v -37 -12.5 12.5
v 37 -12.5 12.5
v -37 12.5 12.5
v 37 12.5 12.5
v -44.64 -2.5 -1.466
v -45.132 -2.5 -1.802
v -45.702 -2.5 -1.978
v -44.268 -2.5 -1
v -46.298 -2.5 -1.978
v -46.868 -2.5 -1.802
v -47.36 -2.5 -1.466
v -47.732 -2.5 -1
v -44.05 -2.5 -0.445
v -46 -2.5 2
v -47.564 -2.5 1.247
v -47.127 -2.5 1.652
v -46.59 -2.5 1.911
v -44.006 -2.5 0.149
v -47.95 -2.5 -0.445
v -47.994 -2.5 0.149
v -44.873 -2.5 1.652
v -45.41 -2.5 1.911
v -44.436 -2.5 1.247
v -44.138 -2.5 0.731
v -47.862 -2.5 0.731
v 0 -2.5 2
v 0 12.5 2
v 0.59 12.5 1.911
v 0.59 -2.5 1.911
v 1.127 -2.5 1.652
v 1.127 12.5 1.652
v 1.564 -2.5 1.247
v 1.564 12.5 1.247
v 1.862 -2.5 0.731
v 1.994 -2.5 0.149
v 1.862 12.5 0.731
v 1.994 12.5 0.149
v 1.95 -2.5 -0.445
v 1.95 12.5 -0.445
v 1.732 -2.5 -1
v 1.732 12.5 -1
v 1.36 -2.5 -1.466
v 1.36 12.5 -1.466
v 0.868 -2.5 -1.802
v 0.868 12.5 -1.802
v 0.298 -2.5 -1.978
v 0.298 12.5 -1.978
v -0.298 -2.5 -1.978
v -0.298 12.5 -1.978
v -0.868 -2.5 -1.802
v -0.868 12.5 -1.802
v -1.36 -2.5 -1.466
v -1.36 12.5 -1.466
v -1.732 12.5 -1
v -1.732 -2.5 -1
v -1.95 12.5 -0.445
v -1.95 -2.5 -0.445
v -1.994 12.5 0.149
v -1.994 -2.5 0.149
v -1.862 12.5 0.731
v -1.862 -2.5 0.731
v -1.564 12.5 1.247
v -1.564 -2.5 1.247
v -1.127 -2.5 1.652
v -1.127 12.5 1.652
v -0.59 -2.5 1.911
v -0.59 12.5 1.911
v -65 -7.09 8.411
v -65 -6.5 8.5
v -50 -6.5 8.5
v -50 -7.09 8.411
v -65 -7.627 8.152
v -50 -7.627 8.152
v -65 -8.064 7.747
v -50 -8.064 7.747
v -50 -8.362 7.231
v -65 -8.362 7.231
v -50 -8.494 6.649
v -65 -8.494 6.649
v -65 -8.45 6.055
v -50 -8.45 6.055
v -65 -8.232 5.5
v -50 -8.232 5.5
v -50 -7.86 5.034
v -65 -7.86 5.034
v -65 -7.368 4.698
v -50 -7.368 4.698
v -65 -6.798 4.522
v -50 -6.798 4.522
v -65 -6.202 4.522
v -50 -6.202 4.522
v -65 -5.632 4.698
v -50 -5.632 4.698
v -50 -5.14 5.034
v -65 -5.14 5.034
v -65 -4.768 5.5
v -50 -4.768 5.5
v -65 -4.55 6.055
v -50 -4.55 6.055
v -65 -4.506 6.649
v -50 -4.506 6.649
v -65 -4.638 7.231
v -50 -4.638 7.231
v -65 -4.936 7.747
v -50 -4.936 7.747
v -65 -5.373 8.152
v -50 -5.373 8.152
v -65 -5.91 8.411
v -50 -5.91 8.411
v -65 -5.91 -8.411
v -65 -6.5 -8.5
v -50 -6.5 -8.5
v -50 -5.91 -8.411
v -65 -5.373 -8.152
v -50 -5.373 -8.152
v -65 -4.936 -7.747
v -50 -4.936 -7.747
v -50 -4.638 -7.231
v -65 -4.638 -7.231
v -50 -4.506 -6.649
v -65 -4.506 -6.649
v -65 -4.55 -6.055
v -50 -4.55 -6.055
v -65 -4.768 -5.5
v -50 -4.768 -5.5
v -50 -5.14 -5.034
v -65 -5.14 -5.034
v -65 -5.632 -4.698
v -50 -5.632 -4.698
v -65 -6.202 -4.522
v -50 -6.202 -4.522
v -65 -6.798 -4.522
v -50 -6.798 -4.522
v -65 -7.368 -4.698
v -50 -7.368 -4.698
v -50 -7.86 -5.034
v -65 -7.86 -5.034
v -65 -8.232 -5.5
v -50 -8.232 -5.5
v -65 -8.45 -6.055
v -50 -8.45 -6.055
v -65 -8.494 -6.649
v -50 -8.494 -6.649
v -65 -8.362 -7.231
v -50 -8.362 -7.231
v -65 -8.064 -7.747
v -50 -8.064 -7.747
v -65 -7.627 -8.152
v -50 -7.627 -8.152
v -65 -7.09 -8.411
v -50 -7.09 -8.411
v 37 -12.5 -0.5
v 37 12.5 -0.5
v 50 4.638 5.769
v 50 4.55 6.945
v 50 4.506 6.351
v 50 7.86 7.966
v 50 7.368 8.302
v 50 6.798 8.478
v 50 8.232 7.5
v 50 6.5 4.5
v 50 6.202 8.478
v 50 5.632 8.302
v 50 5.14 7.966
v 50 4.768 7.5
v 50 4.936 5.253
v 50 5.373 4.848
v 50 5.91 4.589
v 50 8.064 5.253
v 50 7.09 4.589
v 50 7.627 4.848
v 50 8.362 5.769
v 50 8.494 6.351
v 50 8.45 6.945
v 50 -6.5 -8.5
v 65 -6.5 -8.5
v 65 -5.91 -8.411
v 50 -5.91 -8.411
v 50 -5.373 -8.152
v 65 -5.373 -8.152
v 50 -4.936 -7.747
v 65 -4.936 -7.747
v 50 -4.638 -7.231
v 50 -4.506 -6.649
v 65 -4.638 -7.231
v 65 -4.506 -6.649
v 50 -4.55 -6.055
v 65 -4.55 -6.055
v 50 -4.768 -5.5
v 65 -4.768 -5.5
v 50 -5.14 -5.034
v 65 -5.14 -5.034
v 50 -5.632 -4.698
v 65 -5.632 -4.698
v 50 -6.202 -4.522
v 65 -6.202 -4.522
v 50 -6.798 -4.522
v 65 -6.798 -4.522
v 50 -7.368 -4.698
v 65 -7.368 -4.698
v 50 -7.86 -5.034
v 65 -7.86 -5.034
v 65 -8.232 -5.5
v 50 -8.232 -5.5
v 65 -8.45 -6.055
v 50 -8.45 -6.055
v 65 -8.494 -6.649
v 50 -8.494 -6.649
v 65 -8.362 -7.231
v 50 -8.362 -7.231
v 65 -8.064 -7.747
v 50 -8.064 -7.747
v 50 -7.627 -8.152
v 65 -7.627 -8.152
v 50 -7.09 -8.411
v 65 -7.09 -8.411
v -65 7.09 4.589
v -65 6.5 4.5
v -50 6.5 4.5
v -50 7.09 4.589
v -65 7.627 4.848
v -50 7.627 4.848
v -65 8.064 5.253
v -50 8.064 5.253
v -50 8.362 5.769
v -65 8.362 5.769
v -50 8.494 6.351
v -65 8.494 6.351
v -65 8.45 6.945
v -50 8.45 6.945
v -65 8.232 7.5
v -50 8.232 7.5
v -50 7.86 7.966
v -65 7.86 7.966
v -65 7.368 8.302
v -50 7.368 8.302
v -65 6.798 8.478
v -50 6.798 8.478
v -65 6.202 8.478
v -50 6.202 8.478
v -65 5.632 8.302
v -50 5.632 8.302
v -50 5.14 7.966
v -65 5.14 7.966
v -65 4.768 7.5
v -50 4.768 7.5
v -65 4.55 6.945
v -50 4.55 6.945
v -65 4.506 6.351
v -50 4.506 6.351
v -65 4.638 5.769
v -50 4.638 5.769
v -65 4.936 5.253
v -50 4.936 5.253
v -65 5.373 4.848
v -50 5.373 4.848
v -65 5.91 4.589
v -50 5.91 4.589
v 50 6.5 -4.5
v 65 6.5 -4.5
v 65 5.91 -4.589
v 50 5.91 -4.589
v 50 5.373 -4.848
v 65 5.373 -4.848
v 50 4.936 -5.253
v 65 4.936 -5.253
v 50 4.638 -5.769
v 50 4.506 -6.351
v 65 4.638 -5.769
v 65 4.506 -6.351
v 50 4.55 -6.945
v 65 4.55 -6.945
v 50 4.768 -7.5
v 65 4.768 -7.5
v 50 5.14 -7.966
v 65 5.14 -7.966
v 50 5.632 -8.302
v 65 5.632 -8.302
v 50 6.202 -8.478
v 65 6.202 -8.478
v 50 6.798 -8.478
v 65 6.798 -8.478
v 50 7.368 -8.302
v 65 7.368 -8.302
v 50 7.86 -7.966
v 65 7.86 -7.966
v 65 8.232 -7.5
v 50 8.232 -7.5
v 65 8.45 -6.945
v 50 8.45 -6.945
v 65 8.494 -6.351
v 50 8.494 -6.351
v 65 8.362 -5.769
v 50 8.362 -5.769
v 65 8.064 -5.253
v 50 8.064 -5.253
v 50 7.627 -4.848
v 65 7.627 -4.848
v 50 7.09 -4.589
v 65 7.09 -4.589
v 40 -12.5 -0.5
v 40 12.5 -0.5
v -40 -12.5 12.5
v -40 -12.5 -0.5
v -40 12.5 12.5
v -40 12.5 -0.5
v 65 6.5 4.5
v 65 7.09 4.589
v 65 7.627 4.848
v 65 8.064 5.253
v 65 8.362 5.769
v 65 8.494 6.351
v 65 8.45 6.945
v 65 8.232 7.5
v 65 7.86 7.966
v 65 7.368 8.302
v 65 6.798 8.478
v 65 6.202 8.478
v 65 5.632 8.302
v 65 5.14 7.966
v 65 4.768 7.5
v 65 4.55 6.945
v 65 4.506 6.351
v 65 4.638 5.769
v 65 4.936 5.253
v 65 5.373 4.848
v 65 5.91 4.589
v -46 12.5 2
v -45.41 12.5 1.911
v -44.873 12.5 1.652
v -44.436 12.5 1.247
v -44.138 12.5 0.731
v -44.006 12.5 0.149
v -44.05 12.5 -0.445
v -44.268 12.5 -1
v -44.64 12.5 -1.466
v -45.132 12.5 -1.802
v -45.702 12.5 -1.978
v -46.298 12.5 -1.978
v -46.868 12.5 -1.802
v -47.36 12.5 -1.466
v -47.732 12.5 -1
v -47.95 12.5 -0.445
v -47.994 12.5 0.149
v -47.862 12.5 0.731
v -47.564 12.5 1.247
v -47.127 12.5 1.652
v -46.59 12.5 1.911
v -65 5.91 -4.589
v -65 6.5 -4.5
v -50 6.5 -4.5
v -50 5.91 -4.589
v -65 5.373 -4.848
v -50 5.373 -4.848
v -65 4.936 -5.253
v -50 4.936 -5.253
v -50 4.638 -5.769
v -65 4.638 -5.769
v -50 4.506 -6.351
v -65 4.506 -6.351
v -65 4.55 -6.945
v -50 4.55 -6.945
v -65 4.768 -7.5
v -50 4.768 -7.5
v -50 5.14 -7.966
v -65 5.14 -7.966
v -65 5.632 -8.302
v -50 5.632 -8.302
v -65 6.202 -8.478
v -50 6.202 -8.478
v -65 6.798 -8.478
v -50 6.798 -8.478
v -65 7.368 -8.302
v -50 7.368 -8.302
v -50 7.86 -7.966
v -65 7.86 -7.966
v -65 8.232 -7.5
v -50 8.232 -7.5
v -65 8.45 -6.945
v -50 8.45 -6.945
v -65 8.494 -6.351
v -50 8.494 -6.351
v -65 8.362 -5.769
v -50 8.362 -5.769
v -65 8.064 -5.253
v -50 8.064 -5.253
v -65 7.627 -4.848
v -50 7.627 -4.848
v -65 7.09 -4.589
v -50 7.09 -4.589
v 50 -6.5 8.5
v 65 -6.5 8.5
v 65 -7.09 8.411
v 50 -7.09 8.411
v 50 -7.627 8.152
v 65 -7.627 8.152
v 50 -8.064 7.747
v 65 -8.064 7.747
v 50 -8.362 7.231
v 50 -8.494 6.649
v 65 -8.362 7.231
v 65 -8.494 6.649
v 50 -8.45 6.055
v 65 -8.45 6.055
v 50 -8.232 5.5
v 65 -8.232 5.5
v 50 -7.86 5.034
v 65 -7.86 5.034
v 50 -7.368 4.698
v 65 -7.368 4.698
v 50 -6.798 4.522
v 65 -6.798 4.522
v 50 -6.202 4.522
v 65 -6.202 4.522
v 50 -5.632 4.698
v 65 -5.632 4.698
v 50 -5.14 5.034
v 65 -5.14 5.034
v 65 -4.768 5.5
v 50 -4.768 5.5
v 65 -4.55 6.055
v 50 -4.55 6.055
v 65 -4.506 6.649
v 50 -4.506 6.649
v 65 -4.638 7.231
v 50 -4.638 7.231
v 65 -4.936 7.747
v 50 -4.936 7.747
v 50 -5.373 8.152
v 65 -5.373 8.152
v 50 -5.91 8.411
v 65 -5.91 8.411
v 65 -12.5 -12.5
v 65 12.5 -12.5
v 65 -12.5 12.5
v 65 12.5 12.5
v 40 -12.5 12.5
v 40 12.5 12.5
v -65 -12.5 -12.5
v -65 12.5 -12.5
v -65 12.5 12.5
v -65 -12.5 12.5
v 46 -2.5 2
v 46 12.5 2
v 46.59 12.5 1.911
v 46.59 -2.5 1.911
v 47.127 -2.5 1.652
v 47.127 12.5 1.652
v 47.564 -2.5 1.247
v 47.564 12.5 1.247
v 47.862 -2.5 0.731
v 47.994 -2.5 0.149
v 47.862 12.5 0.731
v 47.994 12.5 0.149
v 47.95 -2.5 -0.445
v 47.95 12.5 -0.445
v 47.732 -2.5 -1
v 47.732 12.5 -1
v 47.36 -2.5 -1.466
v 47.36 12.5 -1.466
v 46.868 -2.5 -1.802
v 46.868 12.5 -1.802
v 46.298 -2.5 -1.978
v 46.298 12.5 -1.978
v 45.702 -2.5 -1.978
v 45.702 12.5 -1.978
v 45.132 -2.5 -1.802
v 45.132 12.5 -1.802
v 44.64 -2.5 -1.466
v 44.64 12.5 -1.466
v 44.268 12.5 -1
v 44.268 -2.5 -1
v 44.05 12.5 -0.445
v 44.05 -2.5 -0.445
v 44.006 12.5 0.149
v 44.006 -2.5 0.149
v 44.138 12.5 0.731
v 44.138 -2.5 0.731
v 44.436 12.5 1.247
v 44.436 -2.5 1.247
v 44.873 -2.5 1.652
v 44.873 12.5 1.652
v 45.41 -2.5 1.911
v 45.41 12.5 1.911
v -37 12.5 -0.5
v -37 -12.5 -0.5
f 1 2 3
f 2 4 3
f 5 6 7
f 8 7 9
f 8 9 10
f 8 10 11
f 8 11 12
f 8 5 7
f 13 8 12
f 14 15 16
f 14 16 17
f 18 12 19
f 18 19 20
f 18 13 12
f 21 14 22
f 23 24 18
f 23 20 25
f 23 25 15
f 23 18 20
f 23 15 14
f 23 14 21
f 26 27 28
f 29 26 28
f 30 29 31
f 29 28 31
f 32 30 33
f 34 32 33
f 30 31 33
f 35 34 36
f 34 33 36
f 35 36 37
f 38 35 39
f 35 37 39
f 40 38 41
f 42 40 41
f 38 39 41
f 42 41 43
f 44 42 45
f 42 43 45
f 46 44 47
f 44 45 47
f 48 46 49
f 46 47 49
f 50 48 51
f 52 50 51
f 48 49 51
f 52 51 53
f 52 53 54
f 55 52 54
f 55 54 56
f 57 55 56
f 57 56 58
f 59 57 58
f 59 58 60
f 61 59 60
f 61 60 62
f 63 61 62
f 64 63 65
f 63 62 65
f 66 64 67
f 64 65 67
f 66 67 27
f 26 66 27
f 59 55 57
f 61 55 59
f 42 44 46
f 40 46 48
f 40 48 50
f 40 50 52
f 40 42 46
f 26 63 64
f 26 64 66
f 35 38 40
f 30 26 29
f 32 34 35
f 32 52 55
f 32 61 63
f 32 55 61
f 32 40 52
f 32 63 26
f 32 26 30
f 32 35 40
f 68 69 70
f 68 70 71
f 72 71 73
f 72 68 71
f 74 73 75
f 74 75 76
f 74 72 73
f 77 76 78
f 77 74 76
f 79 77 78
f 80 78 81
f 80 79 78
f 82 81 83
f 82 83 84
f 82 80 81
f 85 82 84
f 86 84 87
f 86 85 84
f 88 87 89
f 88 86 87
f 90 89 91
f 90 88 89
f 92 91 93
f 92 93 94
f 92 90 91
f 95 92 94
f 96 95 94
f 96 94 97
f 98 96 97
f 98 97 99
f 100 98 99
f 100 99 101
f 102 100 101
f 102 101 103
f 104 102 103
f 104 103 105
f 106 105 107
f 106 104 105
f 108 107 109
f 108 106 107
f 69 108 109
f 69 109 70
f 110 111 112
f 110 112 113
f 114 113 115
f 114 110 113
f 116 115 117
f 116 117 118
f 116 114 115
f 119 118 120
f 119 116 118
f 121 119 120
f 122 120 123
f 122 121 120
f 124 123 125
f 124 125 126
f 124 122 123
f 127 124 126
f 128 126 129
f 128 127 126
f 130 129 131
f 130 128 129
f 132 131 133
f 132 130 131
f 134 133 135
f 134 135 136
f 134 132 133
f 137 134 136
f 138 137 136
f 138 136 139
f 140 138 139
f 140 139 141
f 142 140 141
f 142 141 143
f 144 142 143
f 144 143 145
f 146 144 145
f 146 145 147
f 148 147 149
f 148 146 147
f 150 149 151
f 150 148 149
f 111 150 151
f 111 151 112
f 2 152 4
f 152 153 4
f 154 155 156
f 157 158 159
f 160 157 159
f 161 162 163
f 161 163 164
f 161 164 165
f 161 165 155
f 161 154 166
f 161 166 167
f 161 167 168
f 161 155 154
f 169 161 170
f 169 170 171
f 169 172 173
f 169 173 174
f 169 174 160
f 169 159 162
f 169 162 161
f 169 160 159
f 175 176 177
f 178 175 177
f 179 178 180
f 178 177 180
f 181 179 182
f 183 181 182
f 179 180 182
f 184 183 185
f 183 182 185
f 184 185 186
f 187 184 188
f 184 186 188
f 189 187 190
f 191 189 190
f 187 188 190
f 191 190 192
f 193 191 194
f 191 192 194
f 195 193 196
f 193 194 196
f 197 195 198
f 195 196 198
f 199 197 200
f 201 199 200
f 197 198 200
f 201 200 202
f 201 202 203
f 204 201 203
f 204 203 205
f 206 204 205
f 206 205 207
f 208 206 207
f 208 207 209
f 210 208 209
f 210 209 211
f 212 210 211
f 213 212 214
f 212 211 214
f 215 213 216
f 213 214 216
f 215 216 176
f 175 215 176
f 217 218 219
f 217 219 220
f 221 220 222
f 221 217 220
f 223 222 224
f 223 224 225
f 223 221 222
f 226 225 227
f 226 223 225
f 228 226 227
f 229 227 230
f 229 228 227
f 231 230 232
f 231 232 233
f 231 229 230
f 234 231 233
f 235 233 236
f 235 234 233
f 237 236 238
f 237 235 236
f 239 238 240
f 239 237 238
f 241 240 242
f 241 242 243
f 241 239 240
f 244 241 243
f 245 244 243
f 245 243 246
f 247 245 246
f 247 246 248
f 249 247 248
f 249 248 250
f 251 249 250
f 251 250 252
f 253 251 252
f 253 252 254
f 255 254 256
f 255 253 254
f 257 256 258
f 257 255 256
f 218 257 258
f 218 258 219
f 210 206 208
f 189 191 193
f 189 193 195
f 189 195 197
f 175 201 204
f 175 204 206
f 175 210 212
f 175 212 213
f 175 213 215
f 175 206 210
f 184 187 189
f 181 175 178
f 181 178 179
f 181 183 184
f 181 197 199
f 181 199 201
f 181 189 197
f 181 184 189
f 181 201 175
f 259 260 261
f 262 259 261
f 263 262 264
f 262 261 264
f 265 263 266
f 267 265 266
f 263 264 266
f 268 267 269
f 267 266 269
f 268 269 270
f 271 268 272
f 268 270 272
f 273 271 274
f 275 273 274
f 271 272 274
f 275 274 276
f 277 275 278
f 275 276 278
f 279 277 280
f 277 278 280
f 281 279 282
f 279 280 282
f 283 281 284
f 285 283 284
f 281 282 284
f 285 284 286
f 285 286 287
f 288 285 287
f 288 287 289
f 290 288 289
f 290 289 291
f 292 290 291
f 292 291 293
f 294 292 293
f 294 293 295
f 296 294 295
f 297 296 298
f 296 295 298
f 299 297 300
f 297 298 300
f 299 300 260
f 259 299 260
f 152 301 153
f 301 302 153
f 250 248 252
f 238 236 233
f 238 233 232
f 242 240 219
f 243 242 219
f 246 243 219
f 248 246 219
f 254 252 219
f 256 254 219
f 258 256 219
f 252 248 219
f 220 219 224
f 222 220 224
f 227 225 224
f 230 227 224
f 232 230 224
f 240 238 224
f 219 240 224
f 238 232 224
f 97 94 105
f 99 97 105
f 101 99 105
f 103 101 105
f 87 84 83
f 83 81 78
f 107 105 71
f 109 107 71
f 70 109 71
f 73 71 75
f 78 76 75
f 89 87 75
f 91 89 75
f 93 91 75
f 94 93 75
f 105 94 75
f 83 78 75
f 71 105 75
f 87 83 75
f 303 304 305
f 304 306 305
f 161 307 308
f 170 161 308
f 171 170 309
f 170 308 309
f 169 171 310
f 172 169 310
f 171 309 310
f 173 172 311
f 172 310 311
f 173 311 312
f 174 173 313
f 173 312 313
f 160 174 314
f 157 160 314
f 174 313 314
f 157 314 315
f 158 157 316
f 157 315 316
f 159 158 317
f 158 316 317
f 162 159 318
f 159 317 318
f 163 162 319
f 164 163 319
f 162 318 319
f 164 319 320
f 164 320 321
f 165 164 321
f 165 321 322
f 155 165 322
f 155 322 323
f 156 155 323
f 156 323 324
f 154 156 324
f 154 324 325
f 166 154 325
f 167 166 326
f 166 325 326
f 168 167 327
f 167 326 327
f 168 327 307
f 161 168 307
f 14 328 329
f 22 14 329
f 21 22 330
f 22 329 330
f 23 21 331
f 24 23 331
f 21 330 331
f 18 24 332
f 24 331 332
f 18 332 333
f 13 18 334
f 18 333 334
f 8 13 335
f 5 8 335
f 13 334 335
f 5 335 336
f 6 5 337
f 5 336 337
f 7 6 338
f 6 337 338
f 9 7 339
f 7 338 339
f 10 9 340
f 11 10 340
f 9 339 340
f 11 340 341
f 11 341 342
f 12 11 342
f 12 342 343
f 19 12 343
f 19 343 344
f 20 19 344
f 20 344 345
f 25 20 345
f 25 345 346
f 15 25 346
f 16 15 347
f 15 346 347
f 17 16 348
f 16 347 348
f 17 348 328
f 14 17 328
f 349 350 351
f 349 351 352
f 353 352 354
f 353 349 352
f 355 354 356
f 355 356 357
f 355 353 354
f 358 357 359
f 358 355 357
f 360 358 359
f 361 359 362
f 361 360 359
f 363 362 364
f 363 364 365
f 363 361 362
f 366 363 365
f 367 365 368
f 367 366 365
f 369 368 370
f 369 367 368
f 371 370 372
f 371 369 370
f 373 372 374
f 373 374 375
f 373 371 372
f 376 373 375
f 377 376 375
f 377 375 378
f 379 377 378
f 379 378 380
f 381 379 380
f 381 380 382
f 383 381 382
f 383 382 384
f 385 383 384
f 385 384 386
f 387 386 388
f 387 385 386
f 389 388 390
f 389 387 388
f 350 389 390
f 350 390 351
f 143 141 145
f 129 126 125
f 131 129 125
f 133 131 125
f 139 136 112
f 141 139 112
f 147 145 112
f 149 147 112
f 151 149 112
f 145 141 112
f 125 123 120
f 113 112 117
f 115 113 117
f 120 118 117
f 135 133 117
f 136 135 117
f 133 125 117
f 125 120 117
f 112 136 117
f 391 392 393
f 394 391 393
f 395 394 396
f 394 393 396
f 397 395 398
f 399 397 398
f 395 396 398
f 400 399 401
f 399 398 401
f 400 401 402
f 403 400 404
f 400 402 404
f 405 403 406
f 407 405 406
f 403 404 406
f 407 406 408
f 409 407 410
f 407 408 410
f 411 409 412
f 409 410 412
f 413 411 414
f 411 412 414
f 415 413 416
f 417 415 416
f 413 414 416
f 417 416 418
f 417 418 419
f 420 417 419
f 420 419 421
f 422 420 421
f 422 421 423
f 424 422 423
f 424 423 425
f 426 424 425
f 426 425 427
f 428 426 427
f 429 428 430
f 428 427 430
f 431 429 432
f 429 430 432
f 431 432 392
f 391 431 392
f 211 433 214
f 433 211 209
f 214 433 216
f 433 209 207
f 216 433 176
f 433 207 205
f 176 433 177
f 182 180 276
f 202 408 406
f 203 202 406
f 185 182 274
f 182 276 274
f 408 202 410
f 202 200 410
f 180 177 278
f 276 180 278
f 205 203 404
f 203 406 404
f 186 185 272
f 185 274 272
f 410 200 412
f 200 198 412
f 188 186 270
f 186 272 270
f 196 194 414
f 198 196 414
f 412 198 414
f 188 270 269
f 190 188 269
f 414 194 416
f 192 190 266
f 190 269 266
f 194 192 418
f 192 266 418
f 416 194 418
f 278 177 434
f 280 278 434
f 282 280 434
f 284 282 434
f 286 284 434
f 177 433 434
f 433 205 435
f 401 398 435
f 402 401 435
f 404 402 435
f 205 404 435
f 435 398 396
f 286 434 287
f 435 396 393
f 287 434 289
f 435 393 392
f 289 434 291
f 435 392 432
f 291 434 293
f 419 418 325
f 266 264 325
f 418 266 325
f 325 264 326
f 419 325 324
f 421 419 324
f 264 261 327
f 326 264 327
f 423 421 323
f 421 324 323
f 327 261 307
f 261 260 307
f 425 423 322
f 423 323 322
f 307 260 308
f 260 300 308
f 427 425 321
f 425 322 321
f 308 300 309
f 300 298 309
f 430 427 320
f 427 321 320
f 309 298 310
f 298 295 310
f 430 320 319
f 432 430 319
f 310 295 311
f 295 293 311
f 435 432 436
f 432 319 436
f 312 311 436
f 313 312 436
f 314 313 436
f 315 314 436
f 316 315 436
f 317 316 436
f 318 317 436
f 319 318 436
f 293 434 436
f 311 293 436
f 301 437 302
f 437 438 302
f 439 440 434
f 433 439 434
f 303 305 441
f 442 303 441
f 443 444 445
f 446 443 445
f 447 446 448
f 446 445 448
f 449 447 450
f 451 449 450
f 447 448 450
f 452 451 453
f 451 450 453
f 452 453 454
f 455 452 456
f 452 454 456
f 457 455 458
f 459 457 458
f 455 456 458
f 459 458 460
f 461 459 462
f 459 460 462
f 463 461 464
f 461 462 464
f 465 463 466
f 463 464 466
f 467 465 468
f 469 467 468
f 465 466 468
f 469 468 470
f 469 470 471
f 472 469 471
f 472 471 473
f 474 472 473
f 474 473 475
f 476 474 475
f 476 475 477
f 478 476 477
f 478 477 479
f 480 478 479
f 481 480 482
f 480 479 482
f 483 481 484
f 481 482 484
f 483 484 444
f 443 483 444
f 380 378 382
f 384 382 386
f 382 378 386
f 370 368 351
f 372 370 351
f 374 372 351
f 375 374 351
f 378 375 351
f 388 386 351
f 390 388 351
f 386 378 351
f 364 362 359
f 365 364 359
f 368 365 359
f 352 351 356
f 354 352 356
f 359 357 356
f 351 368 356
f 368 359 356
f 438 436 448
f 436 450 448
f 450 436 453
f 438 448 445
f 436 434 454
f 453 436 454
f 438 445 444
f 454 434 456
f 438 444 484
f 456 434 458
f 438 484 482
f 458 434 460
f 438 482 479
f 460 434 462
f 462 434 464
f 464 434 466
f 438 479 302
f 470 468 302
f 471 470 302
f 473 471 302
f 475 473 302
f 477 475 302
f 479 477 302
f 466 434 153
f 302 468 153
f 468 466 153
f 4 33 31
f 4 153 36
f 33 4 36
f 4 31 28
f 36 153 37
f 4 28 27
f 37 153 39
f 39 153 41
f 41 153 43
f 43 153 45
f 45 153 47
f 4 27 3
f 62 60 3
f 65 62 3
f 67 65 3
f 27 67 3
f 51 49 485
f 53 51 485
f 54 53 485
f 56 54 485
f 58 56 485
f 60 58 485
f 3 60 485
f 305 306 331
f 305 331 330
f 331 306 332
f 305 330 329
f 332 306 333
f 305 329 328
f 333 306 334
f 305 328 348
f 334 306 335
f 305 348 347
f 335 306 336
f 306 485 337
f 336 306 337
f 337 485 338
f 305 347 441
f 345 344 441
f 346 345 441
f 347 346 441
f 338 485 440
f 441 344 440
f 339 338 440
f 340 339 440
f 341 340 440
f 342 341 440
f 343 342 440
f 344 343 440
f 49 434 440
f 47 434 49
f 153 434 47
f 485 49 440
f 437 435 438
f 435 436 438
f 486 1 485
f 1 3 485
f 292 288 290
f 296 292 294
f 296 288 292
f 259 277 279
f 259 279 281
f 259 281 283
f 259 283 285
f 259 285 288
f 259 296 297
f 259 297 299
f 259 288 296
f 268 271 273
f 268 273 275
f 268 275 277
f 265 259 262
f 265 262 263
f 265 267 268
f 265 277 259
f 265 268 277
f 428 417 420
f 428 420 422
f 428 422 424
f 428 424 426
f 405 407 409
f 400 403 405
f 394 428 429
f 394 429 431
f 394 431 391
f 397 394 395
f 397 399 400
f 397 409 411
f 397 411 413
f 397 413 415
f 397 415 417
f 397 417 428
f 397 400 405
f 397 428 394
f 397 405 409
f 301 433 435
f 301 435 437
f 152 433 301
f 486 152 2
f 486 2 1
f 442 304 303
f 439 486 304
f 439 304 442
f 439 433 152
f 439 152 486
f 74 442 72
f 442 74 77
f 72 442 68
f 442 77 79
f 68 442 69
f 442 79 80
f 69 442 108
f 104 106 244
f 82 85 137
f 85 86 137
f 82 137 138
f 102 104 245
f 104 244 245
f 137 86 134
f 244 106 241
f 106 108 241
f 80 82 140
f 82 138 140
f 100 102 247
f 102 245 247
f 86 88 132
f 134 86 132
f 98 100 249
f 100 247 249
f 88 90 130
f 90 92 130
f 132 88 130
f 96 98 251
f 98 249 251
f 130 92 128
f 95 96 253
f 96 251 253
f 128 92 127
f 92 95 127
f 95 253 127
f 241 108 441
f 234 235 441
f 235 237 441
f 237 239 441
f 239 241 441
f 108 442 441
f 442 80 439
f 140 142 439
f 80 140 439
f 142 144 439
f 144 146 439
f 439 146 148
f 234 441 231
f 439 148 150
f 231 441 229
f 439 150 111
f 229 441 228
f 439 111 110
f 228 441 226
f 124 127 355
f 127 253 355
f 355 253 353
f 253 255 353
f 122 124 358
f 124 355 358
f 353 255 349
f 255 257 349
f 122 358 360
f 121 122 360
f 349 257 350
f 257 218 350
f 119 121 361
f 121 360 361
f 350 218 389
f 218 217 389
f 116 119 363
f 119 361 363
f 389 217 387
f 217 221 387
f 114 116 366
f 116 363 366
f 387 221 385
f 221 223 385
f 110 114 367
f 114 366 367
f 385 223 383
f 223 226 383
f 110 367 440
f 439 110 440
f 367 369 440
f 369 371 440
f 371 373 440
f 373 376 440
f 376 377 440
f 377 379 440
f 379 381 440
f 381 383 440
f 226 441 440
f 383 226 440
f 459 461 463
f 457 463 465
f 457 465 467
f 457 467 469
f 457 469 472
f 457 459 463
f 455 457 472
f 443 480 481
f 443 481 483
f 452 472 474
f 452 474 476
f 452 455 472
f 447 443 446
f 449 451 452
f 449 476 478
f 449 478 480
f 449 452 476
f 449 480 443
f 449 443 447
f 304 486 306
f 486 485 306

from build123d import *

# Parameters (mm, degrees)
BOSS_EXTRUDE1_DEPTH = 12.5
SKETCH2_R           = 2
CUT_EXTRUDE1_DEPTH  = 15
SKETCH3_R           = 2
CUT_EXTRUDE2_DEPTH  = 15


with BuildPart() as part:
    # Sketch1 → Boss-Extrude1 (new, symmetric)
    with BuildSketch(Plane(origin=(0, 0, 0), x_dir=(1, 0, 0), z_dir=(0, 1, 0))):
        Polygon((-65, 12.5), (65, 12.5), (65, -12.5), (40, -12.5), (40, 0.5), (37, 0.5), (37, -12.5), (-37, -12.5), (-37, 0.5), (-40, 0.5), (-40, -12.5), (-65, -12.5), align=None)
    extrude(amount=BOSS_EXTRUDE1_DEPTH, both=True)

    # Sketch2 → Cut-Extrude1 (cut)
    with BuildSketch(Plane(origin=(65, 0, 0), x_dir=(0, 0, -1), z_dir=(1, 0, 0))):
        with Locations((-6.5, 6.5)):
            Circle(SKETCH2_R)
        with Locations(Location((6.5, 6.5, 0), (0, 0, 180))):
            Circle(SKETCH2_R)
        with Locations((6.5, -6.5)):
            Circle(SKETCH2_R)
        with Locations(Location((-6.5, -6.5, 0), (0, 0, 180))):
            Circle(SKETCH2_R)
    cut_extrude1 = extrude(amount=-CUT_EXTRUDE1_DEPTH, mode=Mode.SUBTRACT)

    # Sketch3 → Cut-Extrude2 (cut)
    with BuildSketch(Plane(origin=(0, 12.5, 0), x_dir=(1, 0, 0), z_dir=(0, 1, 0))):
        with Locations(Location((46, 0, 0), (0, 0, 270))):
            Circle(SKETCH3_R)
        with Locations(Location((0, 0, 0), (0, 0, 270))):
            Circle(SKETCH3_R)
        with Locations(Location((-46, 0, 0), (0, 0, 270))):
            Circle(SKETCH3_R)
    extrude(amount=-CUT_EXTRUDE2_DEPTH, mode=Mode.SUBTRACT)

    # Mirror1: Cut-Extrude1 across plane
    add(cut_extrude1.mirror(Plane(origin=(0, 0, 0), x_dir=(0, 0, 1), z_dir=(1, 0, 0))), mode=Mode.SUBTRACT)


solid = part.part
